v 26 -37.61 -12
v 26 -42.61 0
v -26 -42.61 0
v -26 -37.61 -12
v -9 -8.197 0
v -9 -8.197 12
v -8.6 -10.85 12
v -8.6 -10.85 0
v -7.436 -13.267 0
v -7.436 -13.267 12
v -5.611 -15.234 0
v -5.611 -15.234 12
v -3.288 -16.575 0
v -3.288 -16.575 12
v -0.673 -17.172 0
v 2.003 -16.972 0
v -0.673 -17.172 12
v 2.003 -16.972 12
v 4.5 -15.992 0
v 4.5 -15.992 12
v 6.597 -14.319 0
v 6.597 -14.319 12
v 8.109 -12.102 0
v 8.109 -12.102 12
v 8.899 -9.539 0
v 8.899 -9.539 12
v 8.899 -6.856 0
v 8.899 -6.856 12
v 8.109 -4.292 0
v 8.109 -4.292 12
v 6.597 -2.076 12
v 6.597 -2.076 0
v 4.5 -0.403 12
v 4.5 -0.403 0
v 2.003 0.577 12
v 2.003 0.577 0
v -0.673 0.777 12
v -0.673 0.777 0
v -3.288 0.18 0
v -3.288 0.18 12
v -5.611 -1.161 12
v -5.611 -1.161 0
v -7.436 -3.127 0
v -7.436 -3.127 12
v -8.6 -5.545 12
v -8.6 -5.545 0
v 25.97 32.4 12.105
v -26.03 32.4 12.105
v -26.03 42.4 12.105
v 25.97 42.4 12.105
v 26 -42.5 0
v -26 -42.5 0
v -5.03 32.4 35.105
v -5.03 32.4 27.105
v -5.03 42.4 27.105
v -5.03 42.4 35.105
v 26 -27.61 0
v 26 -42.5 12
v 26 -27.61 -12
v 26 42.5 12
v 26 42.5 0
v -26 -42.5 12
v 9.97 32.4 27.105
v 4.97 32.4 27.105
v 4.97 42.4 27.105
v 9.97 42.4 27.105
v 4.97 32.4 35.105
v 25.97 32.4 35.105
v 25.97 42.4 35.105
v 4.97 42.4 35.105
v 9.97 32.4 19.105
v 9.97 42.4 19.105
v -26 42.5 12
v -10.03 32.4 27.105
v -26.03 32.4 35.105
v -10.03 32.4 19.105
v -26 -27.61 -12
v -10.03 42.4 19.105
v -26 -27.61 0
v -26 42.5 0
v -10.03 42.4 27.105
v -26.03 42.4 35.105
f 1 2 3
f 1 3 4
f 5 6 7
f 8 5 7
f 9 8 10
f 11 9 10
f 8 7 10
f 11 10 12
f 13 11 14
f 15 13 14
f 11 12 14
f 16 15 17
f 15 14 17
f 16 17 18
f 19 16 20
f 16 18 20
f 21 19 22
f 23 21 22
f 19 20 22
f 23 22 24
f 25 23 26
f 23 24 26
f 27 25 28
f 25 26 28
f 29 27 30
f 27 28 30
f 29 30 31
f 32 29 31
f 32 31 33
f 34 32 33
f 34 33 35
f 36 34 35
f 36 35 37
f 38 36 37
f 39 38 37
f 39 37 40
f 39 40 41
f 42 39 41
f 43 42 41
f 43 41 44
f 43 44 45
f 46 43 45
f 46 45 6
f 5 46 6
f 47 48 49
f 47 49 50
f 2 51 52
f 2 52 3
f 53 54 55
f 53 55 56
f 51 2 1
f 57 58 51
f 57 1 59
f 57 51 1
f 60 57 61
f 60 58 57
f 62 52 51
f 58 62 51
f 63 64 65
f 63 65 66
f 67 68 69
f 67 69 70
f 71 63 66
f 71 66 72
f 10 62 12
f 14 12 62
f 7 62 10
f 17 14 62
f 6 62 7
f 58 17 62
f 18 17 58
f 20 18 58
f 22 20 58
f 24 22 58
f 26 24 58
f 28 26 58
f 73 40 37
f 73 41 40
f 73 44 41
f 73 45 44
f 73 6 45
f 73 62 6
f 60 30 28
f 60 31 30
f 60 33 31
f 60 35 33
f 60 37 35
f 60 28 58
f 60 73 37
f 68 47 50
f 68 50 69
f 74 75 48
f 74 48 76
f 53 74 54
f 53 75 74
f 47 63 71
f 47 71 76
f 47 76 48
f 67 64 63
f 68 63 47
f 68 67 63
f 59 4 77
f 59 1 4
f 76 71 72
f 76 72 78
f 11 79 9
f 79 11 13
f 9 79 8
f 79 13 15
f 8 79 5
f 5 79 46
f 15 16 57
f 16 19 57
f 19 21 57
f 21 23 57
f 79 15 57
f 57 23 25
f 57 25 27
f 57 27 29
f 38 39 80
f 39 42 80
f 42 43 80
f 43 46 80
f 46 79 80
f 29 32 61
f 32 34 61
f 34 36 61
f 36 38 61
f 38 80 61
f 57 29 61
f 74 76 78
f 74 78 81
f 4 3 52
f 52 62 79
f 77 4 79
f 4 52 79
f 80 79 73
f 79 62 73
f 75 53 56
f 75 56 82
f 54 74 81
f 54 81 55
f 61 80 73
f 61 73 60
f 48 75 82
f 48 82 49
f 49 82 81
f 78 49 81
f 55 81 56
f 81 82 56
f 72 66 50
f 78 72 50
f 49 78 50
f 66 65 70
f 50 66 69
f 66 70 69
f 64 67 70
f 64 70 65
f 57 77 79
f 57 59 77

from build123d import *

# Parameters (mm, degrees)
F0_W     = 52
F0_H     = 85
F1_DEPTH = 12
F3_D     = 18
F5_DEPTH = 26
F7_START = -32.4
F7_DEPTH = 10


with BuildPart() as f1:
    # F0 (on Top) → F1 (new body)
    with BuildSketch(Plane.XY):
        Rectangle(F0_W, F0_H)
    extrude(amount=F1_DEPTH)

    # F3 (through all)
    with Locations(Plane(origin=(0, 0, 0), x_dir=(1, 0, 0), z_dir=(0, 0, -1))):
        with Locations((0, 8.197368371)):
            Hole(F3_D / 2)

    # F4 (on Right) → F5 (join, symmetric)
    with BuildSketch(Plane.YZ):
        Polygon((-27.6099449657, -12), (-27.6099449657, 0), (-42.6099449657, 0), (-37.6099449657, -12), align=None)
    extrude(amount=F5_DEPTH, both=True)


with BuildPart() as f7:
    # F6 (on Front) → F7 (new body)
    with BuildSketch(Plane.XZ.offset(F7_START)):
        Polygon((-26.0302734937, 35.1048394236), (-26.0302734937, 12.1048394236), (25.9697265063, 12.1048394236), (25.9697265063, 35.1048394236), (4.9697265063, 35.1048394236), (4.9697265063, 27.1048394236), (9.9697265063, 27.1048394236), (9.9697265063, 19.1048394236), (-10.0302734937, 19.1048394236), (-10.0302734937, 27.1048394236), (-5.0302734937, 27.1048394236), (-5.0302734937, 35.1048394236), align=None)
    extrude(amount=-F7_DEPTH)


solid = Compound([f1.part, f7.part])
